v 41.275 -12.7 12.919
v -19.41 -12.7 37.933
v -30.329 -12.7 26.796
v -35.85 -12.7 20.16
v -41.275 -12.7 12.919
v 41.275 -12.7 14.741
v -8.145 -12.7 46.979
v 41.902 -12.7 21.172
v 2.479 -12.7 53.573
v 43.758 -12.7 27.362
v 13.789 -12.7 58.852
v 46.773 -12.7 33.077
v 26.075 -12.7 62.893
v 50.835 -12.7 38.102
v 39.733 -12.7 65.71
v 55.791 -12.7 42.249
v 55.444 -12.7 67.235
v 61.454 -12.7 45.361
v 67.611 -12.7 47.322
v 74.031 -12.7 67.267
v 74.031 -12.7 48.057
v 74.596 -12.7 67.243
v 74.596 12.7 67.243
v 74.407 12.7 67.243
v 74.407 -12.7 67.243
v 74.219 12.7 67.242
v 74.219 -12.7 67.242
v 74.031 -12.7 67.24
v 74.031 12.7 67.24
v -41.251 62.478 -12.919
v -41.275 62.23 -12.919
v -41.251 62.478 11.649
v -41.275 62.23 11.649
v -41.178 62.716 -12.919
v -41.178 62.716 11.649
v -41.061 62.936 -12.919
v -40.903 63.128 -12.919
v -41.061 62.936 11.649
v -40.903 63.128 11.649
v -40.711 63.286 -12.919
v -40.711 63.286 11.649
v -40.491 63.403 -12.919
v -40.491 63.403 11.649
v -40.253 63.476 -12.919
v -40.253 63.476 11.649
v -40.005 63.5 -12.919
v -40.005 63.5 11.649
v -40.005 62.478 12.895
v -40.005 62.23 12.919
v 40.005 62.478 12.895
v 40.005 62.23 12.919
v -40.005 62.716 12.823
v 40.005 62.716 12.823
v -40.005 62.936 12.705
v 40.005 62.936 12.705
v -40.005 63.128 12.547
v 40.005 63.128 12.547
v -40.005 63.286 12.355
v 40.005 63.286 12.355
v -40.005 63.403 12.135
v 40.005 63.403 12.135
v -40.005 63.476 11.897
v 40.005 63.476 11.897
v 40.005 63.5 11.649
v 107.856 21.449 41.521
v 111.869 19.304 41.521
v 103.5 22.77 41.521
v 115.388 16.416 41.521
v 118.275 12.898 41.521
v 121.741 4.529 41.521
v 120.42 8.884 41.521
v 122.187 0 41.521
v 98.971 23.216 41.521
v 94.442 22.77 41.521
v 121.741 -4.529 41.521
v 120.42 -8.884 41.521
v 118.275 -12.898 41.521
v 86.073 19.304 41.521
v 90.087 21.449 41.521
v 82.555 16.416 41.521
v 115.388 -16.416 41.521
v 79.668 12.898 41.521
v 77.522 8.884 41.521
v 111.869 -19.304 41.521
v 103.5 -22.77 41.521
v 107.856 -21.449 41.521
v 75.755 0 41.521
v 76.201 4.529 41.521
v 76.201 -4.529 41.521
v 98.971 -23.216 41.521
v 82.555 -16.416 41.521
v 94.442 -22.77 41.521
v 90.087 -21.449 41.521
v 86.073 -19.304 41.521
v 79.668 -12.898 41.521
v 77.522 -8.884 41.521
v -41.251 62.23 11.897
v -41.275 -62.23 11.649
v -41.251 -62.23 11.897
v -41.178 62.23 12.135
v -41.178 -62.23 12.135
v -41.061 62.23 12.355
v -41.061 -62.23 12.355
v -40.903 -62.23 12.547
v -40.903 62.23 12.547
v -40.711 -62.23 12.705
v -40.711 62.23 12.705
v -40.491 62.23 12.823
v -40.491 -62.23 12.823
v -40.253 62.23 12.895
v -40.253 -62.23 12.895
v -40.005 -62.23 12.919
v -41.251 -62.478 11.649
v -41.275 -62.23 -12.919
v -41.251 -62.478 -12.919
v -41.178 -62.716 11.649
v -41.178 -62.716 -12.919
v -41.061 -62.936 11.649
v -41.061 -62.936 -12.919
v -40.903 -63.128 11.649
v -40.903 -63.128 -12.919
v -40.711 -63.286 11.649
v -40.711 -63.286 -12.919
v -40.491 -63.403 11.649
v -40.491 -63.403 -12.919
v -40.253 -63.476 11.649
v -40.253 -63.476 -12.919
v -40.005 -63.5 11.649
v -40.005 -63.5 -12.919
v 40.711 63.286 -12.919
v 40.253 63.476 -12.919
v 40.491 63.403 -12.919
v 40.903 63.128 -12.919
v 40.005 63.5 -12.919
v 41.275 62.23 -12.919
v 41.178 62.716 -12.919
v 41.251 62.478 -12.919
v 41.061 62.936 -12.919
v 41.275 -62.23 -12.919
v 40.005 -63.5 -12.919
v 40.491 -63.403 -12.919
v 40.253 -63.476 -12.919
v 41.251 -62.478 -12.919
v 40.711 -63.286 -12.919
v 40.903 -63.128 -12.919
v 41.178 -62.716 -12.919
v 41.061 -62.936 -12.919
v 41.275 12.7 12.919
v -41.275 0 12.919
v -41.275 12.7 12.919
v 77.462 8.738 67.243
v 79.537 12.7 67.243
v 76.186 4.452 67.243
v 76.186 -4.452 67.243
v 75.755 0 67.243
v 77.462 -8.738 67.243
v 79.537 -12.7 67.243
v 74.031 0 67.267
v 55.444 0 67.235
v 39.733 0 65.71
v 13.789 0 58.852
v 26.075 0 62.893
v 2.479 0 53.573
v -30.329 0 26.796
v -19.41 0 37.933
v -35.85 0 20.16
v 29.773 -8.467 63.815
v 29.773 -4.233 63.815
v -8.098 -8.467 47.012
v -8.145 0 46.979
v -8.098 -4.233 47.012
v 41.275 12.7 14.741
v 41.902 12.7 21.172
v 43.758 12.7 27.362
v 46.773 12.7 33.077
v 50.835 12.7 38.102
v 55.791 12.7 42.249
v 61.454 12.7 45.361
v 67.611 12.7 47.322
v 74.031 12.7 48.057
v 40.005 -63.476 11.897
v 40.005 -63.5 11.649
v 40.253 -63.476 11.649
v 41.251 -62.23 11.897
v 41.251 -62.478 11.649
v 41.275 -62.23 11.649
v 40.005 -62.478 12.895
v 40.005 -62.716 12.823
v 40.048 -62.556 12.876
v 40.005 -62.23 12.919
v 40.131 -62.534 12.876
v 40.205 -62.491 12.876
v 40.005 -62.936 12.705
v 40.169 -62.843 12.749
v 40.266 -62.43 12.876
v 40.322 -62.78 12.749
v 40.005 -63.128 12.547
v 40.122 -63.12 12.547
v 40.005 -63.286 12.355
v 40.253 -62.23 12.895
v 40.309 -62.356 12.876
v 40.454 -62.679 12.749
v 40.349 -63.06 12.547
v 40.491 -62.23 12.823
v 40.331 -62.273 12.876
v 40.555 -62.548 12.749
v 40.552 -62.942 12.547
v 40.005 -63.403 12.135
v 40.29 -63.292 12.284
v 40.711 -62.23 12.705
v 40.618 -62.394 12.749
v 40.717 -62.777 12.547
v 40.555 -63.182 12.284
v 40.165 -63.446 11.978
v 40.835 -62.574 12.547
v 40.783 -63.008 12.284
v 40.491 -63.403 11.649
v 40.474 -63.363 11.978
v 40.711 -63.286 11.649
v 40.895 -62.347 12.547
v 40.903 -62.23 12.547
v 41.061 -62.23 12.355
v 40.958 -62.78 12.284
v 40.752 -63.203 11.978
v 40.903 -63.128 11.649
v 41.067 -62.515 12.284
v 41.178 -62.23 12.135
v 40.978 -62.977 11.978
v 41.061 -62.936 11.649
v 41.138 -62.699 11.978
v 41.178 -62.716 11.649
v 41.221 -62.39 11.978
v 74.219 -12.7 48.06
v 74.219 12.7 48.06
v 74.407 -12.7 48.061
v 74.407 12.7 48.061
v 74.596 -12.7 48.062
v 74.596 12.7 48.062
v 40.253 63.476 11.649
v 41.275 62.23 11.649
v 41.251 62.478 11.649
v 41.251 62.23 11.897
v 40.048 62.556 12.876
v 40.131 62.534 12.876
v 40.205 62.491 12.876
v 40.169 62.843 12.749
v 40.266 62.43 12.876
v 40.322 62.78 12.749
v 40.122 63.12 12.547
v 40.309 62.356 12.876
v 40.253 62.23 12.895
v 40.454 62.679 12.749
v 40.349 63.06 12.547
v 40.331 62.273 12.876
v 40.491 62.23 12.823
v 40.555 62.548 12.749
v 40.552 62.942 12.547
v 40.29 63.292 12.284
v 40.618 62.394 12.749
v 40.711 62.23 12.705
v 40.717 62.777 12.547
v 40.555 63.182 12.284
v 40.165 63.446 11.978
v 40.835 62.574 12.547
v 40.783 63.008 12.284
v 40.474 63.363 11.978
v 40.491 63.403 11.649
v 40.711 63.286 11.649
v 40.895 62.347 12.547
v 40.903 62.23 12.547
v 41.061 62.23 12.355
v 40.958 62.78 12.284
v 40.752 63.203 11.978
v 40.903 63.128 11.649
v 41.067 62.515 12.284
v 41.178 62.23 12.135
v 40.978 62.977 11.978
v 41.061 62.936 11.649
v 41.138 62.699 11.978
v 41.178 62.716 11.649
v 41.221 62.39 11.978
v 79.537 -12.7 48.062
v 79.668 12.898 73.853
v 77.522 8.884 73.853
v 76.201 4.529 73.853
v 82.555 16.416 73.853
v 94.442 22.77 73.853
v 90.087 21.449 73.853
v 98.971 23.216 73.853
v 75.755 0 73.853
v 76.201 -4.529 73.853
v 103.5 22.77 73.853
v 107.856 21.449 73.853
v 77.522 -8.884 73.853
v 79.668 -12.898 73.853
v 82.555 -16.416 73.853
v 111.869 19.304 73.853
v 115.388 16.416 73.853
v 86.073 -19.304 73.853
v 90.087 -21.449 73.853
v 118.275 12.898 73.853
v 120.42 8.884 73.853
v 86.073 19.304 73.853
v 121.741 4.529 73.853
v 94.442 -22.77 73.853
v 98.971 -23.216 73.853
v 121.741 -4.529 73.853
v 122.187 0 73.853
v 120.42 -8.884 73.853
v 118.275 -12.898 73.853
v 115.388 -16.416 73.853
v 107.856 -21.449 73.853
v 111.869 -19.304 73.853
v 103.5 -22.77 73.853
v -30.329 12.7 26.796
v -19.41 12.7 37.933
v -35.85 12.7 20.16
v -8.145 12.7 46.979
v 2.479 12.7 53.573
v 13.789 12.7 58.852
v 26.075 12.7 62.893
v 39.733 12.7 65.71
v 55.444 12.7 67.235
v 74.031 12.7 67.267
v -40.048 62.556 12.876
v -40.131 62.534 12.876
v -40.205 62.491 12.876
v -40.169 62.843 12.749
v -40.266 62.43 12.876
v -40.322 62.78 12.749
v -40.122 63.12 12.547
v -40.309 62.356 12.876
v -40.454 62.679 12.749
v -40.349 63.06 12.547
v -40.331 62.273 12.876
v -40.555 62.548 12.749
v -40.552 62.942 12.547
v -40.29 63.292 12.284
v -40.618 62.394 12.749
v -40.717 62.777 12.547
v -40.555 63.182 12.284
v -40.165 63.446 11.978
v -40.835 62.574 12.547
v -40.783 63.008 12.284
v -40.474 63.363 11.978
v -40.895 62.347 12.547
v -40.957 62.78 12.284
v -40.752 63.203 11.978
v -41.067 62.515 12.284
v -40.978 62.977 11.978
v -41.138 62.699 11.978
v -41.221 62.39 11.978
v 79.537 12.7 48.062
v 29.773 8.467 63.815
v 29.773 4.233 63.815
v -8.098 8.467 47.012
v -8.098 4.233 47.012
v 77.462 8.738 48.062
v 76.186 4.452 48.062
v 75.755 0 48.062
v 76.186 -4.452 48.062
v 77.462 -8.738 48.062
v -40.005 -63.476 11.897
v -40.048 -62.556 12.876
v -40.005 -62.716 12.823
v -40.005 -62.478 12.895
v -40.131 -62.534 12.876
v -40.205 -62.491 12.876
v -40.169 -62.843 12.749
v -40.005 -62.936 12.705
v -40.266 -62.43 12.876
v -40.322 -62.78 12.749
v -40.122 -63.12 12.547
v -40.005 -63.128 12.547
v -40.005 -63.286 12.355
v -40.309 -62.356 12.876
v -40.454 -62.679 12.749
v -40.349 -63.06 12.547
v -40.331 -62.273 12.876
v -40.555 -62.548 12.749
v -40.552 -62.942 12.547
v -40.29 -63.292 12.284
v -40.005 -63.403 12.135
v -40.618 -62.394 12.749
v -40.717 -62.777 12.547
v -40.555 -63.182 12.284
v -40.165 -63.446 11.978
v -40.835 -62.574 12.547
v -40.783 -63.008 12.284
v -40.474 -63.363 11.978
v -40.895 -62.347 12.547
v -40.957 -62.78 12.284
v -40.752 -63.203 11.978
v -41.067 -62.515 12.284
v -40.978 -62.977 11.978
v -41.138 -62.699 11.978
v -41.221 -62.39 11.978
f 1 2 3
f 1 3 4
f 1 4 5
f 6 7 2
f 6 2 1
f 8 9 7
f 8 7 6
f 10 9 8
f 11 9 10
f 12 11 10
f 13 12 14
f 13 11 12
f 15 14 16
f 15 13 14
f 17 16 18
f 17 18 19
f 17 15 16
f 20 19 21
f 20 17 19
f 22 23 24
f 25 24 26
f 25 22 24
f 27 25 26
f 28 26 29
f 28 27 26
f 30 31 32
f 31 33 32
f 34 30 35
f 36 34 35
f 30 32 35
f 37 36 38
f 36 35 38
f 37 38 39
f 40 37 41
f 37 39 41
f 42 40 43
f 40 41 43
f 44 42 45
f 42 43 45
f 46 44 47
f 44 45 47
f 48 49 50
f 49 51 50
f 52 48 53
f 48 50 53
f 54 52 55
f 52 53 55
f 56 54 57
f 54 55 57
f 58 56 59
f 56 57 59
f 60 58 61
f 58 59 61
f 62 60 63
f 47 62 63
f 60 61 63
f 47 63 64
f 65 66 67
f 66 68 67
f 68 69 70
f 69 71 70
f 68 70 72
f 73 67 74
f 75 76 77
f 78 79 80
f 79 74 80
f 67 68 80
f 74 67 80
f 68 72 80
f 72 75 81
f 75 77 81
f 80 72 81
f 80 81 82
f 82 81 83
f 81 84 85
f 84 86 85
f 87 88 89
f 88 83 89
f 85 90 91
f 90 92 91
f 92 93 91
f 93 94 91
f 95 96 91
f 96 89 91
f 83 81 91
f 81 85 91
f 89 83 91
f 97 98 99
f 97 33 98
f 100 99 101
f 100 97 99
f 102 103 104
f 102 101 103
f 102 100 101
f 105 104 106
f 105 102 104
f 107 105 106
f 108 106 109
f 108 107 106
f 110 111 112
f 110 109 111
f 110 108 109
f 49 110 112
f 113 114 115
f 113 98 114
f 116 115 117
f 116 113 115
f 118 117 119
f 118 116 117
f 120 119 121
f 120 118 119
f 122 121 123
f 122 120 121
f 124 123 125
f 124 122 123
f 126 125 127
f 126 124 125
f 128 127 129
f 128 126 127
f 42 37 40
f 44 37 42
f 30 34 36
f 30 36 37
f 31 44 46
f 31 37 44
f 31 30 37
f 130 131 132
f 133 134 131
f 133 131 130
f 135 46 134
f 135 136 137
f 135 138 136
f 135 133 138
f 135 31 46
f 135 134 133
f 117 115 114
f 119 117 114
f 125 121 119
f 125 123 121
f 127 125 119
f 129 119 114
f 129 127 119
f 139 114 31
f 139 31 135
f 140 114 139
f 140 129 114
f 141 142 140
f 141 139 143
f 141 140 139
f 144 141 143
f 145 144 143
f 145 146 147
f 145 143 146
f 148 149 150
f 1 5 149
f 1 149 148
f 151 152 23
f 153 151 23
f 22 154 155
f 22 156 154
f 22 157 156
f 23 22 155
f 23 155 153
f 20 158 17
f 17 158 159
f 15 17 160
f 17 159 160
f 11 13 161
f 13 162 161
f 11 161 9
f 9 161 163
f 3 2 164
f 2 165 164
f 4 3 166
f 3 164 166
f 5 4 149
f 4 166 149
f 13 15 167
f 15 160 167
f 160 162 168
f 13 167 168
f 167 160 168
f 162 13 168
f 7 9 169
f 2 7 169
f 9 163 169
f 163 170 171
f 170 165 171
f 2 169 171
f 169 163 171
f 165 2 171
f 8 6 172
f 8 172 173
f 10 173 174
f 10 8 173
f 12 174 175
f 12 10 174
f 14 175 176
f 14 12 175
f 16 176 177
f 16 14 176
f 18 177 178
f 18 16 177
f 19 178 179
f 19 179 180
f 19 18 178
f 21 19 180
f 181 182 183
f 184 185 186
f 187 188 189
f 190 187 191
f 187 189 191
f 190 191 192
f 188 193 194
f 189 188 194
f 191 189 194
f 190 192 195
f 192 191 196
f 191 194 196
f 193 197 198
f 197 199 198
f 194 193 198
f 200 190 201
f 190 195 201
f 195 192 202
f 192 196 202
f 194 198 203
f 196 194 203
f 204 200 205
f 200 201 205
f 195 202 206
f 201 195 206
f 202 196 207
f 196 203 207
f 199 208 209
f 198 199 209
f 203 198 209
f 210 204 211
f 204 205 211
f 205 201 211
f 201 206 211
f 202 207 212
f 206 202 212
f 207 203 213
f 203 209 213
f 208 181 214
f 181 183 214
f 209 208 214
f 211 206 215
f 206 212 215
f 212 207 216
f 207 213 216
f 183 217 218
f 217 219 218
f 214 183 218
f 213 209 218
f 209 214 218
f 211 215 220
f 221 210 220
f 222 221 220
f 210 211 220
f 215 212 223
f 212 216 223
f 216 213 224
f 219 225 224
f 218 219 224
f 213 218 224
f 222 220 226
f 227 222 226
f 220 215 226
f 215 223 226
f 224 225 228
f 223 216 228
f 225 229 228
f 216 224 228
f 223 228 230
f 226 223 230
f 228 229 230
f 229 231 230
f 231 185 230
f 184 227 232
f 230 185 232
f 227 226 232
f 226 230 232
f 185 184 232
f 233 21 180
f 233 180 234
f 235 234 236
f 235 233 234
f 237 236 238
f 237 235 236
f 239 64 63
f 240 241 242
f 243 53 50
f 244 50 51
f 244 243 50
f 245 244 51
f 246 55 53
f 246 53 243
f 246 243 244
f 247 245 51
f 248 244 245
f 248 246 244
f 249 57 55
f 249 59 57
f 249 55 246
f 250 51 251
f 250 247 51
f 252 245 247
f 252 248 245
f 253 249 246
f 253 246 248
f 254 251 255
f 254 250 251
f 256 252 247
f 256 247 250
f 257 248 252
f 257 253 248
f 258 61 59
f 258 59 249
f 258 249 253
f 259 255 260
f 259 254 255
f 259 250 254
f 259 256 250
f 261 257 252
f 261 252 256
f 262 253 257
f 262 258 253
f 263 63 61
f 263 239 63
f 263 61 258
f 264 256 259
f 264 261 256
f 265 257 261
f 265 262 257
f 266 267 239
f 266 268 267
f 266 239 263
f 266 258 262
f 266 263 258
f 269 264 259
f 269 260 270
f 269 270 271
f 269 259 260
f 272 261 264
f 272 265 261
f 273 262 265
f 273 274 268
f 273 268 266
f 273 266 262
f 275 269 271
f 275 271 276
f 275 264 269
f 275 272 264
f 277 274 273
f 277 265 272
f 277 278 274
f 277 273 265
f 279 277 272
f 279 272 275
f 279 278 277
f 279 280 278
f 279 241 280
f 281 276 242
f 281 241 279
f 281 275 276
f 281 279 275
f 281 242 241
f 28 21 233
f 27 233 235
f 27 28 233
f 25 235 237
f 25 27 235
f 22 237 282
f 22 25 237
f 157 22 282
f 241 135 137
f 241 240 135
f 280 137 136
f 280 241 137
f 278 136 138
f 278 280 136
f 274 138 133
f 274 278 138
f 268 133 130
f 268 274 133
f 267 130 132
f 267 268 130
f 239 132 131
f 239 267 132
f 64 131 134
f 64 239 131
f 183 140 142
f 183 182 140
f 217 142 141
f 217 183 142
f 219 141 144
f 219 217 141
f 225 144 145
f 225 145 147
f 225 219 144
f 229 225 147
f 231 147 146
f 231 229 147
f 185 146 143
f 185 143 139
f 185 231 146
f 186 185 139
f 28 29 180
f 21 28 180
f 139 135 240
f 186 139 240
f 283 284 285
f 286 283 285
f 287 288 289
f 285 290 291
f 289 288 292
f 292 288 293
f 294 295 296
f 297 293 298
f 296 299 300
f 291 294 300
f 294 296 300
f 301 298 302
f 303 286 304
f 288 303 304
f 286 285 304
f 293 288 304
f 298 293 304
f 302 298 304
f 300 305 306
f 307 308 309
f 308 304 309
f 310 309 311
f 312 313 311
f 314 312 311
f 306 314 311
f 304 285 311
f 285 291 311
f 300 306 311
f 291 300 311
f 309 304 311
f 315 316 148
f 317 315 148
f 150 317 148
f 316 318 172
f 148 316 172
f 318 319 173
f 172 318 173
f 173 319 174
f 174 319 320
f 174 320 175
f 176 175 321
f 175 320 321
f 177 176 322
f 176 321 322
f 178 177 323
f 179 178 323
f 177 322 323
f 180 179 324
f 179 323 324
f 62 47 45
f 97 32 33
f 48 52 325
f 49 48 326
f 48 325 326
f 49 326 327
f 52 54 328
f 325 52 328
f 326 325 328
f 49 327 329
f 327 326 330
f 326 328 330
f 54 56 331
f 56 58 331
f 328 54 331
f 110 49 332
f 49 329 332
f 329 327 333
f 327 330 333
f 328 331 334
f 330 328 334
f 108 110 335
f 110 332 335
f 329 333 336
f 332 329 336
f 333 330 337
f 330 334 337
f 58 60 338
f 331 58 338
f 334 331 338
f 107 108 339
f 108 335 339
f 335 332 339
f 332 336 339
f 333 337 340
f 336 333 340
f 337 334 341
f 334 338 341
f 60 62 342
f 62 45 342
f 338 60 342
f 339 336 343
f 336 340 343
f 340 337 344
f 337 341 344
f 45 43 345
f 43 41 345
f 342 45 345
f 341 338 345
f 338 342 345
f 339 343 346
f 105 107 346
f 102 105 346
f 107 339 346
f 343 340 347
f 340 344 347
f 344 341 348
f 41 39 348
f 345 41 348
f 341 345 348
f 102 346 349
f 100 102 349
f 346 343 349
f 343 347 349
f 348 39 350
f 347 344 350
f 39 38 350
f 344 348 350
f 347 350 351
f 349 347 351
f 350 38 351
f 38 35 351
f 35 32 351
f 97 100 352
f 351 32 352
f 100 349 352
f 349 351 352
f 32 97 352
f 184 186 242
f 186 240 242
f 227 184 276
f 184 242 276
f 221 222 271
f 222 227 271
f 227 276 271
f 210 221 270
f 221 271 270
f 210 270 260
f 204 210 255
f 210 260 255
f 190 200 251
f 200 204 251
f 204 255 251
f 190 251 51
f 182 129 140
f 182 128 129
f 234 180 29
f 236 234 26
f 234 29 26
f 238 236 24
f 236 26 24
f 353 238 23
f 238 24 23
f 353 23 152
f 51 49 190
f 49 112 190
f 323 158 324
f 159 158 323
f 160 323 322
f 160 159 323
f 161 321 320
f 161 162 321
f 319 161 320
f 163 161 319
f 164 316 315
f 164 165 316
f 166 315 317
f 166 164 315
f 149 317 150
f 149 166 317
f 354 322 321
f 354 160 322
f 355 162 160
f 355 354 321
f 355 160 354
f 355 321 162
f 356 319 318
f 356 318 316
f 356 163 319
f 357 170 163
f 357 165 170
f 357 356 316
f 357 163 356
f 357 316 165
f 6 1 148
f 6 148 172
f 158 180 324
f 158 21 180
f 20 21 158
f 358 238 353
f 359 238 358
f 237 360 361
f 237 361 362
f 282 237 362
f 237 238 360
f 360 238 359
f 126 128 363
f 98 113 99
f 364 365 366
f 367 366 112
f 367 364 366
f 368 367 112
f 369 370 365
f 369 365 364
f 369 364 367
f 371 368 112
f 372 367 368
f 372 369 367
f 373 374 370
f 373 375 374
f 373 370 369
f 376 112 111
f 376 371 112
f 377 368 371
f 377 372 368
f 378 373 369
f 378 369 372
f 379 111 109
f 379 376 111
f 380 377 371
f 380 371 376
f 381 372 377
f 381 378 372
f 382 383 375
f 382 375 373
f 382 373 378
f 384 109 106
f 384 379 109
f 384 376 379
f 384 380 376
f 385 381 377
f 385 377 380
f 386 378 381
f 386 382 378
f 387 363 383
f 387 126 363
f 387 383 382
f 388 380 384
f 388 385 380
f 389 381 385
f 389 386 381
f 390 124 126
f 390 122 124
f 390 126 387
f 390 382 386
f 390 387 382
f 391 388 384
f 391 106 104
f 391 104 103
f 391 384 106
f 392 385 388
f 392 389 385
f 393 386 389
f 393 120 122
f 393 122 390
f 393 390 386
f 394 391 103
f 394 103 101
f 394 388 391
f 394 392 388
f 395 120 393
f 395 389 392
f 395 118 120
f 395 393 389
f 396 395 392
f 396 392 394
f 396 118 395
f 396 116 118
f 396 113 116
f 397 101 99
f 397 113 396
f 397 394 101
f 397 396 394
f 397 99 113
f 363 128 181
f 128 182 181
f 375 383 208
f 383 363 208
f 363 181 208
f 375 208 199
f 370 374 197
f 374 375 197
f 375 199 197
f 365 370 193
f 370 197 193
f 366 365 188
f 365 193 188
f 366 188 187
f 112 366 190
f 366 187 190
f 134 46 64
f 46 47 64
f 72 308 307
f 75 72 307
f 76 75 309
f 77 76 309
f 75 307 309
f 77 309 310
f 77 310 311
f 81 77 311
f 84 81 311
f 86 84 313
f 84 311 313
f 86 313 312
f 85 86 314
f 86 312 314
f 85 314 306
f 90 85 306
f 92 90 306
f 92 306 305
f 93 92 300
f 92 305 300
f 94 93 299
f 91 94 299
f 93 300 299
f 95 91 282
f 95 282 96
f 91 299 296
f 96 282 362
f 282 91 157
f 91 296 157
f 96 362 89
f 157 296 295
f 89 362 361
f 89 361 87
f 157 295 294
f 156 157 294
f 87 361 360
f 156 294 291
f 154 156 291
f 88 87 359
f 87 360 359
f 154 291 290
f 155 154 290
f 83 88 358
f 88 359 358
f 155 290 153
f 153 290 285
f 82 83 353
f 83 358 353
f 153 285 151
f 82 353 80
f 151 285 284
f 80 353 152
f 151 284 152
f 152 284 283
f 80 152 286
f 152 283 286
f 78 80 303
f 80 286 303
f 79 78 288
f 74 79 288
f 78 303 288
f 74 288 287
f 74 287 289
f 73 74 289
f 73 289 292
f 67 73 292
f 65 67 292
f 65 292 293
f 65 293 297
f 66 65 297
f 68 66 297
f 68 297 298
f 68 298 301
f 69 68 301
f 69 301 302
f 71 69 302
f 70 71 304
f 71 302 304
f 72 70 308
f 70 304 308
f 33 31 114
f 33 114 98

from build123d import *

# Parameters (mm, degrees)
F0_W     = 82.55
F0_H     = 25.838906
F1_DEPTH = 63.5
F2_DEPTH = 12.7
F3_DEPTH = 12.7
F5_R     = 1.27


with BuildPart() as f1:
    # F0 (on Front) → F1 (new body, symmetric)
    with BuildSketch(Plane.XZ):
        Rectangle(F0_W, F0_H)
    extrude(amount=F1_DEPTH, both=True)

    # F5
    f5_edges = [f1.edges().sort_by_distance(p)[0] for p in [
        (41.275, -63.5, 0),
        (-41.275, -63.5, 0),
        (41.275, 63.5, 0),
        (-41.275, 63.5, 0),
        (0, 63.5, 12.919453),
        (0, -63.5, 12.919453),
        (-41.275, 0, 12.919453),
        (41.275, 0, 12.919453),
    ]]
    fillet(f5_edges, radius=F5_R)


with BuildPart() as f2:
    # F0 (on Front) → F2 (new body, symmetric)
    with BuildSketch(Plane.XZ):
        with BuildLine():
            Line((74.030705, 67.240396), (74.030705, 48.057029))
            ThreePointArc((74.030705, 48.057029), (74.313179, 48.060622), (74.595673, 48.061819))
            Line((74.595673, 48.061819), (98.971203, 48.061819))
            Line((98.971203, 48.061819), (98.971203, 67.243436))
            Line((98.971203, 67.243436), (74.595673, 67.243436))
            ThreePointArc((74.595673, 67.243436), (74.313185, 67.242676), (74.030705, 67.240396))
        make_face()
    extrude(amount=F2_DEPTH, both=True)

    # F0 (on Front) → F4 (revolve)
    with BuildSketch(Plane.XZ):
        Polygon((122.187451, 73.852692), (98.971203, 73.852692), (98.971203, 67.243436), (98.971203, 48.061819), (98.971203, 41.52089), (122.187451, 41.52089), align=None)
    revolve(axis=Axis((98.971203, 0, 57.652628), (0, 0, -1)))


with BuildPart() as f3:
    # F0 (on Front) → F3 (new body, symmetric)
    with BuildSketch(Plane.XZ):
        with BuildLine():
            Line((-41.275, 12.919453), (41.275, 12.919453))
            Line((41.275, 12.919453), (41.275, 14.741147))
            ThreePointArc((41.275, 14.741147), (50.835492, 38.10182), (74.030705, 48.057029))
            Line((74.030705, 48.057029), (74.030705, 67.240396))
            Line((74.030705, 67.240396), (74.030705, 67.266531))
            add(Edge.make_bspline(
                [(74.030705, 67.266531), (26.017085, 69.175991), (-9.882587, 56.971381), (-41.275, 12.919453)],
                knots=[0.499492, 0.499492, 0.499492, 0.499492, 127.973075, 127.973075, 127.973075, 127.973075], degree=3))
        make_face()
    extrude(amount=F3_DEPTH, both=True)


solid = Compound([f1.part, f2.part, f3.part])
